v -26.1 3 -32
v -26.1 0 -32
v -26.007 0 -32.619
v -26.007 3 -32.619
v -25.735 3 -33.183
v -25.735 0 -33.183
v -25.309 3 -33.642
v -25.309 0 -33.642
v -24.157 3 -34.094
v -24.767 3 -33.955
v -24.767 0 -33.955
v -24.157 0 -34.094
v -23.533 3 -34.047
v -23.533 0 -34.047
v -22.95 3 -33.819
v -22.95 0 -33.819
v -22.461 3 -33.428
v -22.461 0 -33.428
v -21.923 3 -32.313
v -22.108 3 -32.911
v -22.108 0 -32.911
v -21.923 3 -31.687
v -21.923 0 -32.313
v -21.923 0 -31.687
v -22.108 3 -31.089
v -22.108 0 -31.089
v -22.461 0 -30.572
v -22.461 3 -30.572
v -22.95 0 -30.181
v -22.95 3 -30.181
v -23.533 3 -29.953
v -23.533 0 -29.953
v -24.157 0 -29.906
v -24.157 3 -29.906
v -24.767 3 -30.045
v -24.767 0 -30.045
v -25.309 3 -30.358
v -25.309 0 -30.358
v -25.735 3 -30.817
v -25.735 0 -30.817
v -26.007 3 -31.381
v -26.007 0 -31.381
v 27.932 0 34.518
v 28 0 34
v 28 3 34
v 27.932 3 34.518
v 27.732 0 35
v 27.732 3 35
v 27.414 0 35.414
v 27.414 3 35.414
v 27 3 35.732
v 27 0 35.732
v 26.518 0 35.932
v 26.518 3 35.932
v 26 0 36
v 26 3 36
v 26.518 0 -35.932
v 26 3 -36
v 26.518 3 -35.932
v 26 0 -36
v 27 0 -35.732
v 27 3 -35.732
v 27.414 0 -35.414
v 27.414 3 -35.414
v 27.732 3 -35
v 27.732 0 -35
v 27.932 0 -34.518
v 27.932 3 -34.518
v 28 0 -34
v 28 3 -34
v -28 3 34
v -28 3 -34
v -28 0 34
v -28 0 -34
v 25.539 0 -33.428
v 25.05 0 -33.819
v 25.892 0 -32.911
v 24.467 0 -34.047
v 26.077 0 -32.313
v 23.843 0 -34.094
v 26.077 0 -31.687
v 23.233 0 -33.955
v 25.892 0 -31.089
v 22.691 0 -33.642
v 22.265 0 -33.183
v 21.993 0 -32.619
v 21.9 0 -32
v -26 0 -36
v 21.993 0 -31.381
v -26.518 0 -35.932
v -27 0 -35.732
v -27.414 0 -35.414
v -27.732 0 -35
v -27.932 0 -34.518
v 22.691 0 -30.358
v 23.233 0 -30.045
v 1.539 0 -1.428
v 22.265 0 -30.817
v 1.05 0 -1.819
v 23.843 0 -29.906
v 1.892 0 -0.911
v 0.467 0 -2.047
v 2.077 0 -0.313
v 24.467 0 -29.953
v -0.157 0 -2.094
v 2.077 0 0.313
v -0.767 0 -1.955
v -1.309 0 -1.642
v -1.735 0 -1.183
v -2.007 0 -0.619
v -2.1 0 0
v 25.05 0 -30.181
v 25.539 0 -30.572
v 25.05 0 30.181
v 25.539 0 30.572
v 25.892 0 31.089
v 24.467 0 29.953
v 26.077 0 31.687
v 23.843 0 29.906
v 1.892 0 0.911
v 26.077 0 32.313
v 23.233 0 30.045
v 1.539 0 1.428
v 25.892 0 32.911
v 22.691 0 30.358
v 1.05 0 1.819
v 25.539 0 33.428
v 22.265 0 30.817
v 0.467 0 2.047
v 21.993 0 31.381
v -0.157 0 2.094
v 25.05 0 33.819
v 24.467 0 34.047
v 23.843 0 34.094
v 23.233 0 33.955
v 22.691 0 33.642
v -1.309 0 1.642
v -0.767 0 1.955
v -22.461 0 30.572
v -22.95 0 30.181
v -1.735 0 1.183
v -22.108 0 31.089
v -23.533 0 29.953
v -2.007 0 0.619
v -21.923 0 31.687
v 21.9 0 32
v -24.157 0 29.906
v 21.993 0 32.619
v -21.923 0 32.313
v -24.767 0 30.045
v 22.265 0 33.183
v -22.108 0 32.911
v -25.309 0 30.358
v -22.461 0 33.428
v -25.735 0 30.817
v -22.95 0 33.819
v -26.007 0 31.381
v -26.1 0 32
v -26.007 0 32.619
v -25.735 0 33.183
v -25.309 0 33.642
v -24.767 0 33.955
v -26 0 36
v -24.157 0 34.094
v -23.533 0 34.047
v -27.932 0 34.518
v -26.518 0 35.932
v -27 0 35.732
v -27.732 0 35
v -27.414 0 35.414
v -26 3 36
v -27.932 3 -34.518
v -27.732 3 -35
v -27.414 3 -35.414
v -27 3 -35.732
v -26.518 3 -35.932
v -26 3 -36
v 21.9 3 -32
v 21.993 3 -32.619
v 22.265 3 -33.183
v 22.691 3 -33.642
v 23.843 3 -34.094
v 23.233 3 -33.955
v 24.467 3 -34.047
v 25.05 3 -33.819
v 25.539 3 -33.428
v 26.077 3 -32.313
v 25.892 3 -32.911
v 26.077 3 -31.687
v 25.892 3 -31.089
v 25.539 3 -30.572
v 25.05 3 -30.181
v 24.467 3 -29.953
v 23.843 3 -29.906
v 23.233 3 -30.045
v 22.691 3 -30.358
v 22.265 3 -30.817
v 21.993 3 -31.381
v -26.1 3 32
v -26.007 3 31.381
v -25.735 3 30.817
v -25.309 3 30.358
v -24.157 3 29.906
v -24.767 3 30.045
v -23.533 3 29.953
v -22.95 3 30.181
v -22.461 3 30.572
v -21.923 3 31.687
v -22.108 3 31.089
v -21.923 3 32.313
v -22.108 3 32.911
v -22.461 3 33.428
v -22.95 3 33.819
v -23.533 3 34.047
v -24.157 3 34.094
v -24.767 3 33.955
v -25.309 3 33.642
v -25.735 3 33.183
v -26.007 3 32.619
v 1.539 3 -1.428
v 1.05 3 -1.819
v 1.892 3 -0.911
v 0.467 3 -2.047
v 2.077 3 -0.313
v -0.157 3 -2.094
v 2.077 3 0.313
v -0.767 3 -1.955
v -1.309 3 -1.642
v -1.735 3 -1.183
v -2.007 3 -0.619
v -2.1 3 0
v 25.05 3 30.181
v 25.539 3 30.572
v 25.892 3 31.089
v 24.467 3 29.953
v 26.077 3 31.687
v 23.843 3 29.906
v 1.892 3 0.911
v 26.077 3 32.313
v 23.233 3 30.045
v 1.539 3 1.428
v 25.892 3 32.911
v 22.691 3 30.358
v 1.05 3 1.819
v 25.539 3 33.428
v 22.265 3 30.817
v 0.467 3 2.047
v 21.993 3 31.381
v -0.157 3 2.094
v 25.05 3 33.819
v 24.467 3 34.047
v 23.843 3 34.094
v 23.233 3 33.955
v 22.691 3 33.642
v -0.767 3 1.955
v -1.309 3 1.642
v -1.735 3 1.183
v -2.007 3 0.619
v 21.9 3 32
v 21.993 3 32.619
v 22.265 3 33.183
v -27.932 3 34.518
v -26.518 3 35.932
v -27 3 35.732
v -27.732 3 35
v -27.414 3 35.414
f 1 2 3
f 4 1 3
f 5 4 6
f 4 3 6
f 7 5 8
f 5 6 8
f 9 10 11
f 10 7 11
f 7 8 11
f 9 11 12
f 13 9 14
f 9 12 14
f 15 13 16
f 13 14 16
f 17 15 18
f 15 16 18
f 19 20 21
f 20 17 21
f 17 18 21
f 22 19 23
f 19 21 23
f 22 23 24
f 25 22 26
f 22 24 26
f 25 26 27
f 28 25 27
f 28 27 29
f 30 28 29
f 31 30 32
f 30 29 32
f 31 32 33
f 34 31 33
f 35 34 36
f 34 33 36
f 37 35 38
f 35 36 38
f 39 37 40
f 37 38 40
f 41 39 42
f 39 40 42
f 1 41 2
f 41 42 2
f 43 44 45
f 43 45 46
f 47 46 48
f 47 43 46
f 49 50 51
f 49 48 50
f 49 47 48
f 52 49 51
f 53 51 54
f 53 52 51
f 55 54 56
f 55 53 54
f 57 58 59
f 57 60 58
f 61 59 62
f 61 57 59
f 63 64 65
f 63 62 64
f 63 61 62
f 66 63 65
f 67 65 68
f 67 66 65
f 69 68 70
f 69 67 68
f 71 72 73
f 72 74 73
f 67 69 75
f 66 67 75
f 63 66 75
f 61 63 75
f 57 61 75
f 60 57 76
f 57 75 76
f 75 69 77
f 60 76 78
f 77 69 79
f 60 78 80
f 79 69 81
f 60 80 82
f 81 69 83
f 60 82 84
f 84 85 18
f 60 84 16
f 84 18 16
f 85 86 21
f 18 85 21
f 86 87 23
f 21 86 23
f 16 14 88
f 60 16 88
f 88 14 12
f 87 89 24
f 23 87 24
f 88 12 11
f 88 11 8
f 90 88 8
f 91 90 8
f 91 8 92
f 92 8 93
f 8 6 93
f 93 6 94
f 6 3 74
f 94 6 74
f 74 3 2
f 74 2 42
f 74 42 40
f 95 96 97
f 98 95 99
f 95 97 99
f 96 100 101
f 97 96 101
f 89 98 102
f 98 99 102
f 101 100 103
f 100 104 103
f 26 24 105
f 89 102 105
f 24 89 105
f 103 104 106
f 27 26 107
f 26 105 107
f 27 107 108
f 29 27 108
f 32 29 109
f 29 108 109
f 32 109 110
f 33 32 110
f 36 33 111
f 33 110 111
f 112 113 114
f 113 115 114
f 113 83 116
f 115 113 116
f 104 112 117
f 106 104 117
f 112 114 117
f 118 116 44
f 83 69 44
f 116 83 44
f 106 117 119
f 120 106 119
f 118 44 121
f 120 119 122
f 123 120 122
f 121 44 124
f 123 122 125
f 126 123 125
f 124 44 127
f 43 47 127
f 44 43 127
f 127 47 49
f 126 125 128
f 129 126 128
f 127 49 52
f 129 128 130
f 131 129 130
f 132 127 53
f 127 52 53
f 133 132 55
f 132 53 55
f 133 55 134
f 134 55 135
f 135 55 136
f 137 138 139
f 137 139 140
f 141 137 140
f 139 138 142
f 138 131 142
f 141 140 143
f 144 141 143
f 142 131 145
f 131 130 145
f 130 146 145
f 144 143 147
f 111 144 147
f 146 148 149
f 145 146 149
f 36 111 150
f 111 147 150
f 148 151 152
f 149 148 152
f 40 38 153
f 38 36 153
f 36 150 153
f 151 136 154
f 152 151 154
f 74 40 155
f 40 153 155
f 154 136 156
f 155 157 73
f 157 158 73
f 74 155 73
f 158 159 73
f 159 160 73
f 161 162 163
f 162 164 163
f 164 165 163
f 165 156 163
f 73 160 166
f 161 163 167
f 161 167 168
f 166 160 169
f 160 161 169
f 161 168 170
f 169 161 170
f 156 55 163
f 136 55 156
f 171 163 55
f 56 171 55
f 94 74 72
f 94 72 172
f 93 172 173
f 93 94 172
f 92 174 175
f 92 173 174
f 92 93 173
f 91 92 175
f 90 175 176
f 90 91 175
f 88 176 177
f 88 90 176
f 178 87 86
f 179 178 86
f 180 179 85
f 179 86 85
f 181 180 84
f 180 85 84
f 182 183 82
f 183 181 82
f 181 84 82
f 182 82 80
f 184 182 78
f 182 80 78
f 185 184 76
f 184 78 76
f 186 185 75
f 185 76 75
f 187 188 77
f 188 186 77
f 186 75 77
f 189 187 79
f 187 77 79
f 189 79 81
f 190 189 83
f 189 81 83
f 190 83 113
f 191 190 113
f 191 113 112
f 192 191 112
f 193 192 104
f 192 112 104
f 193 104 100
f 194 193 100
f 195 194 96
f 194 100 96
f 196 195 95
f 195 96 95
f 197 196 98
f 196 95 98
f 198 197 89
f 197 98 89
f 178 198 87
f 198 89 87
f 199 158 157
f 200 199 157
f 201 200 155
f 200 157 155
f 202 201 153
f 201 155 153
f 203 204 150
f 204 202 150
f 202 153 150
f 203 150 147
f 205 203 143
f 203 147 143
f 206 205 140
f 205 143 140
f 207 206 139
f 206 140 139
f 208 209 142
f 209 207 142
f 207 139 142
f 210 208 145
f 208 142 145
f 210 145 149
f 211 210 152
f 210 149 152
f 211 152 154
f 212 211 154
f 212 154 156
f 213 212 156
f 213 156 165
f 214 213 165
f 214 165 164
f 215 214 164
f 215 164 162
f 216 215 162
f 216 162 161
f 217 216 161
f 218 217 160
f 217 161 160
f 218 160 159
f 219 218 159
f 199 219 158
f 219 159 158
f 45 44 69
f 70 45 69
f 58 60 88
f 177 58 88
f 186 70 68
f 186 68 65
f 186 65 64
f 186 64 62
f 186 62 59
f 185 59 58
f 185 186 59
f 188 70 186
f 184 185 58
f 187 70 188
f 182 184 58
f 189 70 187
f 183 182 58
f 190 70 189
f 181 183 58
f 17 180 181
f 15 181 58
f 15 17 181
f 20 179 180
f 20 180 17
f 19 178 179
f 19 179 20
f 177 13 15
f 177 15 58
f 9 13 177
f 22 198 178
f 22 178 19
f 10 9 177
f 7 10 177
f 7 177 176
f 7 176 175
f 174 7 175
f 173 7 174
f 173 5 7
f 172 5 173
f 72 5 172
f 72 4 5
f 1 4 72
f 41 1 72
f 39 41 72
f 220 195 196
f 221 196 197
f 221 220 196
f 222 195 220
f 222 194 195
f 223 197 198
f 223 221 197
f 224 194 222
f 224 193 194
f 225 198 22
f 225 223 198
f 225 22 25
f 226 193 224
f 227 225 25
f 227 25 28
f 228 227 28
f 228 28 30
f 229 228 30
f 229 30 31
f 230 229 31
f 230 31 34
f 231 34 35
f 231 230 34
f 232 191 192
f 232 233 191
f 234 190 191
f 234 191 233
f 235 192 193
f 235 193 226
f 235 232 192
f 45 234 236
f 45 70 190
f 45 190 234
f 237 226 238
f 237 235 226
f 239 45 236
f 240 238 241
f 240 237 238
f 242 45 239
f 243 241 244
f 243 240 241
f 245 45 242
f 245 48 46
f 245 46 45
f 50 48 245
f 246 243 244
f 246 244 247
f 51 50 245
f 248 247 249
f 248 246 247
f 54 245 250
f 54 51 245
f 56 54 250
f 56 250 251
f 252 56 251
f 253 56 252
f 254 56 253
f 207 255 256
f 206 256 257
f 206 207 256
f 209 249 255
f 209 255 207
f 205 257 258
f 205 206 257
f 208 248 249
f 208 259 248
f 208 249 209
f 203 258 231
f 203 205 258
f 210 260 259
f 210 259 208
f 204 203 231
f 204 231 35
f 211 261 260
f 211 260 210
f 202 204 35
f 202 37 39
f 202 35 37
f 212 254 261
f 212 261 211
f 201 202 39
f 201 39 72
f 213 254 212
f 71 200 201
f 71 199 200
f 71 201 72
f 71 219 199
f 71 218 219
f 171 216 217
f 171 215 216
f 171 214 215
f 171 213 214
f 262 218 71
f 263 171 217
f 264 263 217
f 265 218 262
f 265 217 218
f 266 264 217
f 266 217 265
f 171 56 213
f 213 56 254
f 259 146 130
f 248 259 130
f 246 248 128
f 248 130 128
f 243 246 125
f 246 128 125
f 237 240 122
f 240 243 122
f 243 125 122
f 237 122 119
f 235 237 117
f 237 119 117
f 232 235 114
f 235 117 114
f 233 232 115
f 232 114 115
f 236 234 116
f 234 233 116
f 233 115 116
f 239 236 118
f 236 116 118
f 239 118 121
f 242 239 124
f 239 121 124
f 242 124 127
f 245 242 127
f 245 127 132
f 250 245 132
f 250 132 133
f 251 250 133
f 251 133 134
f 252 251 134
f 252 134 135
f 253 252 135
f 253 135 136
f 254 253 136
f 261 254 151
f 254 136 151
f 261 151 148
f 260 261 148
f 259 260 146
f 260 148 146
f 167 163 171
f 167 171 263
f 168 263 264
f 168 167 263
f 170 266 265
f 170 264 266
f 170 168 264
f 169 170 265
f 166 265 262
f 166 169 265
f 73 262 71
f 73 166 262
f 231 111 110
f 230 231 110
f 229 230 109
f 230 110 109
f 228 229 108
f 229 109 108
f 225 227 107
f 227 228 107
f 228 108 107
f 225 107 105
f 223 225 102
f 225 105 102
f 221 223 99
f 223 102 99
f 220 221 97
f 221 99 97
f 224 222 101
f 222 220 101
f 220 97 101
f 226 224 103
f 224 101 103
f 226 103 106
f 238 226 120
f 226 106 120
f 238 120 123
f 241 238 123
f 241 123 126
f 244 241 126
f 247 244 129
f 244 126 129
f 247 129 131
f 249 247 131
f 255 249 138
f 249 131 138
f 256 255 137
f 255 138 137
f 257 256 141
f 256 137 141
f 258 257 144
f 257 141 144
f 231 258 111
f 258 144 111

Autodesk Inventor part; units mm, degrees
ref_plane "YZ Plane" through (0, 0, 0) normal (1, 0, 0) x (0, 1, 0)
ref_plane "XZ Plane" through (0, 0, 0) normal (0, 1, 0) x (-1, 0, 0)
ref_plane "XY Plane" through (0, 0, 0) normal (0, 0, 1) x (1, 0, 0)
sketch "Sketch1" plane through (0, 0, 0) normal (0, 1, 0) x (-1, 0, 0)
  line L0 (24, 32) -> (-24, 32) construction
  line L1 (-24, 32) -> (-24, -32) construction
  line L2 (-24, -32) -> (24, -32) construction
  line L3 (24, -32) -> (24, 32) construction
  line L4 (24, 32) -> (-24, -32) construction
  line L5 (-24, 32) -> (24, -32) construction
  line L6 (26, 36) -> (-26, 36)
  line L7 (-28, 34) -> (-28, -34)
  line L8 (-26, -36) -> (26, -36)
  line L9 (28, -34) -> (28, 34)
  arc A0 (26, -36) -> (28, -34) centre (26, -34) ccw
  arc A1 (28, 34) -> (26, 36) centre (26, 34) ccw
  arc A2 (-26, 36) -> (-28, 34) centre (-26, 34) ccw
  arc A3 (-28, -34) -> (-26, -36) centre (-26, -34) ccw
  circle A4 centre (24, -32) radius 2.1
  circle A5 centre (-24, -32) radius 2.1
  circle A6 centre (-24, 32) radius 2.1
  circle A7 centre (24, 32) radius 2.1
  circle A8 centre (0, 0) radius 2.1
  dimension "d0" = 48
  dimension "d1" = 64
  dimension "d2" = 4
  dimension "d3" = 2
  dimension "d4" = 4.2
  dimension "d5" = 4.2
  dimension "d6" = 4.2
  dimension "d7" = 4.2
  dimension "d8" = 4.2
extrude "Extrusion1" add sketch "Sketch1" along normal blind 3
properties part number "StageConnectionPlate" material "Aluminum 6061"
